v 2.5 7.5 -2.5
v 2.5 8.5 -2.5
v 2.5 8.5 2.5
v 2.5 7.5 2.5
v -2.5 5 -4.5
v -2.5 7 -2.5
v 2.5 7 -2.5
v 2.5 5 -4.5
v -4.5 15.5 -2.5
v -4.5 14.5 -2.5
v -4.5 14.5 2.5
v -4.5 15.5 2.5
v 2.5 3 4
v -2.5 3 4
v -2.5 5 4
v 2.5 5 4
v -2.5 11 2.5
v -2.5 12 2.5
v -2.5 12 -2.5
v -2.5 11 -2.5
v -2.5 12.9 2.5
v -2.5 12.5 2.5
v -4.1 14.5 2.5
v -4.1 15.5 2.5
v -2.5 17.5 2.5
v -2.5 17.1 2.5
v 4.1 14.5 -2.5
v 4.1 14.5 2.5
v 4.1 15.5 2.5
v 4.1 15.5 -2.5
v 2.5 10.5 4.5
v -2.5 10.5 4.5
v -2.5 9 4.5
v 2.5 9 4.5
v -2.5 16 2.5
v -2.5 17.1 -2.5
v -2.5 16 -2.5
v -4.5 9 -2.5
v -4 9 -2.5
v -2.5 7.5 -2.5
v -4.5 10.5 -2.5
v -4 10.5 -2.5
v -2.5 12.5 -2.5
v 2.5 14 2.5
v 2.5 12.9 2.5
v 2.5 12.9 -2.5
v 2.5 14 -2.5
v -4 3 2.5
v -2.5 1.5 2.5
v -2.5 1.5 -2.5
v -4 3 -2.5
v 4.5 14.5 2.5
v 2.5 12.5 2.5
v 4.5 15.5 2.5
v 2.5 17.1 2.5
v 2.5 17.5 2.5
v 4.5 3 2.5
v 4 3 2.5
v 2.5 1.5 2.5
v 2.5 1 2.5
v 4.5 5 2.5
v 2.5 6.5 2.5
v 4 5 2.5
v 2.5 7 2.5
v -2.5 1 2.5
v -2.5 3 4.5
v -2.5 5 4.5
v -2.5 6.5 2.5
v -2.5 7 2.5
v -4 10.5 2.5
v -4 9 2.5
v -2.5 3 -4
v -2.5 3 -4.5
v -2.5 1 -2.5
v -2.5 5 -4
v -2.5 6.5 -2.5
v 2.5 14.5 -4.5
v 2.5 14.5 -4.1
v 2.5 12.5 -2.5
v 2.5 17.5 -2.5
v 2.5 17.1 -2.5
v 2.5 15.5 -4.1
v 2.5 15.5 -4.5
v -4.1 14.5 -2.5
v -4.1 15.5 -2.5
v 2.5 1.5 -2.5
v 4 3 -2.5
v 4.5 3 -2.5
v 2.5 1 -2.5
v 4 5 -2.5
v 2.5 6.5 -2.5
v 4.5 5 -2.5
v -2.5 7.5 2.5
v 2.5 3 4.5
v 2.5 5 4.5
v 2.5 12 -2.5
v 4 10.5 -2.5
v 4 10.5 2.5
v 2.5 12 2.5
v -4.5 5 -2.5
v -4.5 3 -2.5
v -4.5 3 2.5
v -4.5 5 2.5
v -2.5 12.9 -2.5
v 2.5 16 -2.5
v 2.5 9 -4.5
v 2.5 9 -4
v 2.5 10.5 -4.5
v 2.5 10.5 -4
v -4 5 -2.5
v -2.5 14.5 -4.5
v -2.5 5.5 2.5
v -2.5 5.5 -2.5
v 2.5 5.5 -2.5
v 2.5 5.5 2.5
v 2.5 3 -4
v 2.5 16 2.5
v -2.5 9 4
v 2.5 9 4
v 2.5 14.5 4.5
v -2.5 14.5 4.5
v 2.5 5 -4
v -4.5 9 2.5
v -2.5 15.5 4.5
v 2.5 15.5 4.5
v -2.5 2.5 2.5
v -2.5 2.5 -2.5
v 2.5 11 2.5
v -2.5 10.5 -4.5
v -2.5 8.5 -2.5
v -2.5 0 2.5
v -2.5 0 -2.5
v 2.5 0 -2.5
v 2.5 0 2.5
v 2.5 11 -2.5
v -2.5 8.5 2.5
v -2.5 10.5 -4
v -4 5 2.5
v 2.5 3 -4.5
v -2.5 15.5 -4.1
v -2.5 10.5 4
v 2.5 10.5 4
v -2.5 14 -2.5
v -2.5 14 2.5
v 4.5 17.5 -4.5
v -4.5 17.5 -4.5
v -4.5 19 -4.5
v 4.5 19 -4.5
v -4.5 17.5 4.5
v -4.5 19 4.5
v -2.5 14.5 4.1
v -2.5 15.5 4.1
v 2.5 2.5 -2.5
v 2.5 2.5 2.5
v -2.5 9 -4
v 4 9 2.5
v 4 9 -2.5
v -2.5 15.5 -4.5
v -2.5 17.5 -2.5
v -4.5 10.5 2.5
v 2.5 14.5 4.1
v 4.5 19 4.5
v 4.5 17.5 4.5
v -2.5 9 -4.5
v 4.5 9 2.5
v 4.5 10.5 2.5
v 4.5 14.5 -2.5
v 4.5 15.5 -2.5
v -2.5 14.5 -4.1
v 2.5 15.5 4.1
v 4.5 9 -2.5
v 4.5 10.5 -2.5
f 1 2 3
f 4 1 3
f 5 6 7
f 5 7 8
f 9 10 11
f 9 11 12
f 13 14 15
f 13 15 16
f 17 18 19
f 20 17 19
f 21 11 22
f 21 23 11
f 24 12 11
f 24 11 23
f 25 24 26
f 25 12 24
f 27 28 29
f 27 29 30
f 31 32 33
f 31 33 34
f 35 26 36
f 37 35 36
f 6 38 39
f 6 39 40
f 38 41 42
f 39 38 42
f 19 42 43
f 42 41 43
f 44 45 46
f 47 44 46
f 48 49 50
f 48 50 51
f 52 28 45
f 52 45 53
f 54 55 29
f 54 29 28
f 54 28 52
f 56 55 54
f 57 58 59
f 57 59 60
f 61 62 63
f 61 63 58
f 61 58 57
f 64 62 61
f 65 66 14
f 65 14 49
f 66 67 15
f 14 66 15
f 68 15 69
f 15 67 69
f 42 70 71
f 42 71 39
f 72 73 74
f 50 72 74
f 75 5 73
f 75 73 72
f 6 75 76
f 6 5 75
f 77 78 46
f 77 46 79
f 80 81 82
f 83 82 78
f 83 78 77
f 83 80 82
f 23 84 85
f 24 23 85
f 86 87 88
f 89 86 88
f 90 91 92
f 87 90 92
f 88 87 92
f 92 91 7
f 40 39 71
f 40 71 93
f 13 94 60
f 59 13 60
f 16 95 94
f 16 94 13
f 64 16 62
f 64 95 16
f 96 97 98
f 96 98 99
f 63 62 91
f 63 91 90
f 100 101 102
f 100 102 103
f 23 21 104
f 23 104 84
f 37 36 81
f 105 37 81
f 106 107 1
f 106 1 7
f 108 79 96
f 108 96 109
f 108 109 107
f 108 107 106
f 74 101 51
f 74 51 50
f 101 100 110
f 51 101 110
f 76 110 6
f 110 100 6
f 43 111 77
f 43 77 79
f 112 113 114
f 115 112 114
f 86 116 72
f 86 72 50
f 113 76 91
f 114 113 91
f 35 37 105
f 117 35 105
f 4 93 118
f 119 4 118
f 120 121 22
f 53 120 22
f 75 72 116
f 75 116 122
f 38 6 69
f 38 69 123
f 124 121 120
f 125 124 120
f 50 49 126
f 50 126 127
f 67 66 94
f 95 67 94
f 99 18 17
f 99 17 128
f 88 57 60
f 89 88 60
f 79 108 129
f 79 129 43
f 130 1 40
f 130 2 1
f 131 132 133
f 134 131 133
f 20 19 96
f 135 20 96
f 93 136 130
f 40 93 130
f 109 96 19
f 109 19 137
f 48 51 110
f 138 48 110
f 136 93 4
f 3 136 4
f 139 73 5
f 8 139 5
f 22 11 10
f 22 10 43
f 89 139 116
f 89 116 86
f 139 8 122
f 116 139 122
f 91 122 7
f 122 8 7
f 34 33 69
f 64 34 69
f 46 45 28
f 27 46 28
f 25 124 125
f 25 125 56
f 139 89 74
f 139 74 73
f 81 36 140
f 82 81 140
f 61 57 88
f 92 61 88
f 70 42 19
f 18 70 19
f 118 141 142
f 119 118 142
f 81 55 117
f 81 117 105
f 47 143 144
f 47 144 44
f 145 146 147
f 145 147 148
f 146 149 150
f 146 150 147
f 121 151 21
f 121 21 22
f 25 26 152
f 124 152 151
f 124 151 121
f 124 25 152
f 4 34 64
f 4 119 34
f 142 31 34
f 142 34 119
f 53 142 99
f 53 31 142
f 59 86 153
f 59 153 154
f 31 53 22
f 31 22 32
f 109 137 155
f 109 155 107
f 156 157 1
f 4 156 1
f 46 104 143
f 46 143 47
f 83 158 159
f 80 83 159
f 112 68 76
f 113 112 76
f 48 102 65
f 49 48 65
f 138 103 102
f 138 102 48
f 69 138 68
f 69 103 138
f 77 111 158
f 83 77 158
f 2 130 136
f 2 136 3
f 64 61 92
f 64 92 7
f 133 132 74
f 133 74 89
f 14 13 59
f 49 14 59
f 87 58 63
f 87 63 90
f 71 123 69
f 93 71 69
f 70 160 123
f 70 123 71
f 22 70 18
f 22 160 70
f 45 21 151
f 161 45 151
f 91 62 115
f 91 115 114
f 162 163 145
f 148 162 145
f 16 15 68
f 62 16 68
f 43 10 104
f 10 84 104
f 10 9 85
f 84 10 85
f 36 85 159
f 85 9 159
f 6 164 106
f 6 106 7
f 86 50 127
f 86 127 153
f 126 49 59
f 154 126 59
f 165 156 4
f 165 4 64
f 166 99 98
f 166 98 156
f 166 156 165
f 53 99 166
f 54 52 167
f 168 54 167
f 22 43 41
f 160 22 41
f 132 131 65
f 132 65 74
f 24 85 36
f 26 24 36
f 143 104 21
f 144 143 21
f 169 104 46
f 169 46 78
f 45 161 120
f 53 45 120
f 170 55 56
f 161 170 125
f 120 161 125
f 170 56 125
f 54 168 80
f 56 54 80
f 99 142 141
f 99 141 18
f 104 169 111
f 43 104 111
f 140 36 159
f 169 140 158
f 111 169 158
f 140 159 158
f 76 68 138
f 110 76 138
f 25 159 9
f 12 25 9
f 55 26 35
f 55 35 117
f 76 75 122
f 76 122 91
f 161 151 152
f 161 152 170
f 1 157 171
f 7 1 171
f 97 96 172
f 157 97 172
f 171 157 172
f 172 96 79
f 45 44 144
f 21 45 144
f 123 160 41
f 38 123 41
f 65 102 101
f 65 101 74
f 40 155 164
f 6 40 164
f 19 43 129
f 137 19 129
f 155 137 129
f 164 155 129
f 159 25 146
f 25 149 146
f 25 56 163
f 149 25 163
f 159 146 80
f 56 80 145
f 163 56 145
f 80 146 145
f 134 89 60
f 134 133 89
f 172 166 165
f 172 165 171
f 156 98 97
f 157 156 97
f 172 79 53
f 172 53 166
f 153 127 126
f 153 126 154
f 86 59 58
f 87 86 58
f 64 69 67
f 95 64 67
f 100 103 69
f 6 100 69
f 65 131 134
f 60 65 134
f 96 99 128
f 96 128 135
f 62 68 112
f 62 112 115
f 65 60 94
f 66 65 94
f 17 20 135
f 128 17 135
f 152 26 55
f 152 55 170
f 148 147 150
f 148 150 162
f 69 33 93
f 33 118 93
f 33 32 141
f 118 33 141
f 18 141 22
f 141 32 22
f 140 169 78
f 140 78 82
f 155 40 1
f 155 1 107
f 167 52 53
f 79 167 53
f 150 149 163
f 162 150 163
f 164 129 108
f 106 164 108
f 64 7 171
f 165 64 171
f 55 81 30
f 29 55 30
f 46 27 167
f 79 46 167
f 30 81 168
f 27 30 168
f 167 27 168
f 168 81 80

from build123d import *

# Parameters (mm, degrees)
SKETCH2_W                = 5
SKETCH2_H                = 5
BOSS_EXTRUDE1_DEPTH      = 2.5
BOSS_EXTRUDE2_DEPTH      = 5
BOSS_EXTRUDE3_DEPTH      = 5
SKETCH5_W                = 0.5
SKETCH5_H                = 5
BOSS_EXTRUDE4_DEPTH      = 1
SKETCH6_W                = 5
SKETCH6_H                = 0.5
BOSS_EXTRUDE5_DEPTH      = 1
MIRROR3_START            = -2.5
MIRROR3_OUTLINE_W        = 0.5
MIRROR3_OUTLINE_H        = 1
MIRROR3_DEPTH            = 5
MIRROR5_COPY_1_DEPTH     = 5
MIRROR5_COPY_2_DEPTH     = 5
MIRROR6_START            = -2.5
MIRROR6_OUTLINE_W        = 1
MIRROR6_OUTLINE_H        = 0.5
MIRROR6_DEPTH            = 5
BOSS_EXTRUDE7_DEPTH      = 5
BOSS_EXTRUDE9_DEPTH      = 5
SKETCH10_W               = 5
SKETCH10_H               = 1
CUT_EXTRUDE1_DEPTH       = 12.543396381
SKETCH11_W               = 5
SKETCH11_H               = 5
BOSS_EXTRUDE11_DEPTH     = 1.5
BOSS_EXTRUDE13_DEPTH     = 5
BOSS_EXTRUDE14_DEPTH     = 5
SKETCH15_W               = 0.5
SKETCH15_H               = 5
BOSS_EXTRUDE15_DEPTH     = 0.75
SKETCH16_W               = 5
SKETCH16_H               = 0.5
BOSS_EXTRUDE16_DEPTH     = 0.75
MIRROR16_COPY_1_SKETCH_W = 0.5
MIRROR16_COPY_1_SKETCH_H = 5
MIRROR16_COPY_1_DEPTH    = 0.75
MIRROR16_COPY_2_SKETCH_W = 5
MIRROR16_COPY_2_SKETCH_H = 0.5
MIRROR16_COPY_2_DEPTH    = 0.75
MIRROR18_COPY_1_DEPTH    = 5
BOSS_EXTRUDE18_DEPTH     = 5
BOSS_EXTRUDE19_DEPTH     = 5
SKETCH20_W               = 5
SKETCH20_H               = 5
BOSS_EXTRUDE20_DEPTH     = 1.5
BOSS_EXTRUDE21_DEPTH     = 5
BOSS_EXTRUDE22_DEPTH     = 5
SKETCH23_W               = 0.4
SKETCH23_H               = 5
BOSS_EXTRUDE23_DEPTH     = 0.5
SKETCH24_W               = 5
SKETCH24_H               = 0.4
BOSS_EXTRUDE24_DEPTH     = 0.5
MIRROR24_START           = -2.5
MIRROR24_OUTLINE_W       = 0.4
MIRROR24_OUTLINE_H       = 0.5
MIRROR24_DEPTH           = 5
MIRROR25_START           = -2.5
MIRROR25_DEPTH           = 5
MIRROR26_START           = -2.5
MIRROR26_OUTLINE_W       = 0.5
MIRROR26_OUTLINE_H       = 0.4
MIRROR26_DEPTH           = 5
BOSS_EXTRUDE25_DEPTH     = 5
BOSS_EXTRUDE26_DEPTH     = 5
SKETCH27_W               = 9
SKETCH27_H               = 9
BOSS_EXTRUDE27_DEPTH     = 1.5


# Read off the part's stored shape, not the designer's step: Mirror3, Mirror6, Mirror24, Mirror25, Mirror26
with BuildPart() as part:
    # Sketch2 → Boss-Extrude1 (new body)
    with BuildSketch(Plane(origin=(0, 0, 0), x_dir=(1, 0, 0), z_dir=(0, 1, 0))):
        Rectangle(SKETCH2_W, SKETCH2_H)
    boss_extrude1 = extrude(amount=BOSS_EXTRUDE1_DEPTH)

    # Sketch3 → Boss-Extrude2 (add)
    with BuildSketch(Plane.XY.offset(2.5)):
        Polygon((-2.5, 1.5), (-4, 3), (-4.5, 3), (-2.5, 1), align=None)
    boss_extrude2 = extrude(amount=-BOSS_EXTRUDE2_DEPTH)

    # Sketch4 → Boss-Extrude3 (add)
    with BuildSketch(Plane(origin=(2.5, 0, 0), x_dir=(0, 0, -1), z_dir=(1, 0, 0))):
        Polygon((2.5, 1.5), (2.5, 1), (4.5, 3), (4, 3), align=None)
    boss_extrude3 = extrude(amount=-BOSS_EXTRUDE3_DEPTH)

    # Sketch5 → Boss-Extrude4 (add)
    with BuildSketch(Plane(origin=(0, 3, 0), x_dir=(1, 0, 0), z_dir=(0, 1, 0))):
        with Locations((-4.25, 0)):
            Rectangle(SKETCH5_W, SKETCH5_H)
    boss_extrude4 = extrude(amount=BOSS_EXTRUDE4_DEPTH)

    # Sketch6 → Boss-Extrude5 (add)
    with BuildSketch(Plane(origin=(0, 3, 0), x_dir=(1, 0, 0), z_dir=(0, 1, 0))):
        with Locations((0, 4.25)):
            Rectangle(SKETCH6_W, SKETCH6_H)
    boss_extrude5 = extrude(amount=BOSS_EXTRUDE5_DEPTH)

    # Mirror1: Boss-Extrude3, Boss-Extrude5 across plane
    add(boss_extrude3.mirror(Plane.XY))
    add(boss_extrude5.mirror(Plane.XY))

    # Mirror2: Boss-Extrude2, Boss-Extrude4 across plane
    add(boss_extrude2.mirror(Plane(origin=(0, 0, 0), x_dir=(0, 0, 1), z_dir=(1, 0, 0))))
    add(boss_extrude4.mirror(Plane(origin=(0, 0, 0), x_dir=(0, 0, 1), z_dir=(1, 0, 0))))

    # Mirror3 outline → Mirror3 (add)
    with BuildSketch(Plane.XY.offset(MIRROR3_START)):
        with Locations((-4.25, 4.5)):
            Rectangle(MIRROR3_OUTLINE_W, MIRROR3_OUTLINE_H)
        with Locations((4.25, 4.5)):
            Rectangle(MIRROR3_OUTLINE_W, MIRROR3_OUTLINE_H)
    extrude(amount=MIRROR3_DEPTH)

    # Mirror4: Boss-Extrude2 across plane
    add(boss_extrude2.mirror(Plane.ZX.offset(4)))

    # Mirror5 copy 1 sketch → Mirror5 copy 1 (add)
    with BuildSketch(Plane(origin=(0, 8, 2.5), x_dir=(-1, 0, 0), z_dir=(0, 0, 1))):
        Polygon((-2.5, 1.5), (-4, 3), (-4.5, 3), (-2.5, 1), align=None)
    extrude(amount=-MIRROR5_COPY_1_DEPTH)

    # Mirror5 copy 2 sketch → Mirror5 copy 2 (add)
    with BuildSketch(Plane(origin=(0, 0, 2.5), x_dir=(-1, 0, 0), z_dir=(0, 0, 1))):
        Polygon((-2.5, -1.5), (-4, -3), (-4.5, -3), (-2.5, -1), align=None)
    extrude(amount=-MIRROR5_COPY_2_DEPTH)

    # Mirror6 outline → Mirror6 (add)
    with BuildSketch(Plane.YZ.offset(MIRROR6_START)):
        with Locations((4.5, -4.25)):
            Rectangle(MIRROR6_OUTLINE_W, MIRROR6_OUTLINE_H)
        with Locations((4.5, 4.25)):
            Rectangle(MIRROR6_OUTLINE_W, MIRROR6_OUTLINE_H)
    extrude(amount=MIRROR6_DEPTH)

    # Mirror10: Boss-Extrude1 across plane
    add(boss_extrude1.mirror(Plane.ZX.offset(4)))

    # Sketch10 → Cut-Extrude1 (cut, through all)
    with BuildSketch(Plane.XY.offset(2.5)):
        with Locations((0, 7.5)):
            Rectangle(SKETCH10_W, SKETCH10_H)
    extrude(amount=-CUT_EXTRUDE1_DEPTH, mode=Mode.SUBTRACT)



with BuildPart() as body_2:
    # Sketch7 → Boss-Extrude7 (new body)
    with BuildSketch(Plane.ZY.offset(2.5)):
        Polygon((-4.5, 5), (-4, 5), (-2.5, 6.5), (-2.5, 7), align=None)
    extrude(amount=-BOSS_EXTRUDE7_DEPTH)


with BuildPart() as body_3:
    # Sketch8 → Boss-Extrude9 (new body)
    with BuildSketch(Plane.ZY.offset(2.5)):
        Polygon((4.5, 5), (4, 5), (2.5, 6.5), (2.5, 7), align=None)
    extrude(amount=-BOSS_EXTRUDE9_DEPTH)


with BuildPart() as part_1:
    add(part.part)

    add(body_2.part)  # Boss-Extrude11 merges body 2

    add(body_3.part)  # Boss-Extrude11 merges body 3
    # Sketch11 → Boss-Extrude11 (add)
    with BuildSketch(Plane(origin=(0, 7, 0), x_dir=(1, 0, 0), z_dir=(0, 1, 0))):
        Rectangle(SKETCH11_W, SKETCH11_H)
    boss_extrude11 = extrude(amount=BOSS_EXTRUDE11_DEPTH)

    # Sketch13 → Boss-Extrude13 (add)
    with BuildSketch(Plane.ZY.offset(2.5)):
        Polygon((2.5, 7), (2.5, 7.5), (4, 9), (4.5, 9), align=None)
    boss_extrude13 = extrude(amount=-BOSS_EXTRUDE13_DEPTH)

    # Sketch14 → Boss-Extrude14 (add)
    with BuildSketch(Plane(origin=(0, 0, -2.5), x_dir=(-1, 0, 0), z_dir=(0, 0, -1))):
        Polygon((2.5, 7), (4.5, 9), (4, 9), (2.5, 7.5), align=None)
    boss_extrude14 = extrude(amount=-BOSS_EXTRUDE14_DEPTH)

    # Mirror12: Boss-Extrude13 across plane
    add(boss_extrude13.mirror(Plane.XY))

    # Mirror13: Boss-Extrude14 across plane
    add(boss_extrude14.mirror(Plane(origin=(0, 0, 0), x_dir=(0, 0, 1), z_dir=(1, 0, 0))))

    # Sketch15 → Boss-Extrude15 (add)
    with BuildSketch(Plane(origin=(0, 9, 0), x_dir=(1, 0, 0), z_dir=(0, 1, 0))):
        with Locations((-4.25, 0)):
            Rectangle(SKETCH15_W, SKETCH15_H)
    boss_extrude15 = extrude(amount=BOSS_EXTRUDE15_DEPTH)

    # Sketch16 → Boss-Extrude16 (add)
    with BuildSketch(Plane(origin=(0, 9, 0), x_dir=(1, 0, 0), z_dir=(0, 1, 0))):
        with Locations((0, 4.25)):
            Rectangle(SKETCH16_W, SKETCH16_H)
    boss_extrude16 = extrude(amount=BOSS_EXTRUDE16_DEPTH)

    # Mirror14: Boss-Extrude15 across plane
    add(boss_extrude15.mirror(Plane(origin=(0, 0, 0), x_dir=(0, 0, 1), z_dir=(1, 0, 0))))

    # Mirror15: Boss-Extrude16 across plane
    add(boss_extrude16.mirror(Plane.XY))

    # Mirror16: Boss-Extrude15, Boss-Extrude16 across plane
    add(boss_extrude15.mirror(Plane.ZX.offset(9.75)))
    add(boss_extrude16.mirror(Plane.ZX.offset(9.75)))

    # Mirror16 copy 1 sketch → Mirror16 copy 1 (add)
    with BuildSketch(Plane(origin=(0, 10.5, 0), x_dir=(-1, 0, 0), z_dir=(0, -1, 0))):
        with Locations((-4.25, 0)):
            Rectangle(MIRROR16_COPY_1_SKETCH_W, MIRROR16_COPY_1_SKETCH_H)
    extrude(amount=MIRROR16_COPY_1_DEPTH)

    # Mirror16 copy 2 sketch → Mirror16 copy 2 (add)
    with BuildSketch(Plane.XZ.offset(-10.5)):
        with Locations((0, 4.25)):
            Rectangle(MIRROR16_COPY_2_SKETCH_W, MIRROR16_COPY_2_SKETCH_H)
    extrude(amount=MIRROR16_COPY_2_DEPTH)

    # Mirror18: Boss-Extrude14 across plane
    add(boss_extrude14.mirror(Plane.ZX.offset(9.75)))

    # Mirror18 copy 1 sketch → Mirror18 copy 1 (add)
    with BuildSketch(Plane(origin=(0, 19.5, -2.5), x_dir=(1, 0, 0), z_dir=(0, 0, -1))):
        Polygon((2.5, 7), (4.5, 9), (4, 9), (2.5, 7.5), align=None)
    extrude(amount=-MIRROR18_COPY_1_DEPTH)

    # Mirror21: Boss-Extrude11 across plane
    add(boss_extrude11.mirror(Plane.ZX.offset(9.75)))



with BuildPart() as body_2_2:
    # Sketch17 → Boss-Extrude18 (new body)
    with BuildSketch(Plane(origin=(2.5, 0, 0), x_dir=(0, 0, -1), z_dir=(1, 0, 0))):
        Polygon((4, 10.5), (4.5, 10.5), (2.5, 12.5), (2.5, 12), align=None)
    extrude(amount=-BOSS_EXTRUDE18_DEPTH)


with BuildPart() as body_3_2:
    # Sketch18 → Boss-Extrude19 (new body)
    with BuildSketch(Plane(origin=(2.5, 0, 0), x_dir=(0, 0, -1), z_dir=(1, 0, 0))):
        Polygon((-4.5, 10.5), (-4, 10.5), (-2.5, 12), (-2.5, 12.5), align=None)
    extrude(amount=-BOSS_EXTRUDE19_DEPTH)


with BuildPart() as part_2:
    add(part_1.part)

    add(body_2_2.part)  # Boss-Extrude20 merges body 2 2

    add(body_3_2.part)  # Boss-Extrude20 merges body 3 2
    # Sketch20 → Boss-Extrude20 (add)
    with BuildSketch(Plane(origin=(0, 12.5, 0), x_dir=(1, 0, 0), z_dir=(0, 1, 0))):
        Rectangle(SKETCH20_W, SKETCH20_H)
    boss_extrude20 = extrude(amount=BOSS_EXTRUDE20_DEPTH)

    # Sketch21 → Boss-Extrude21 (add)
    with BuildSketch(Plane.XY.offset(2.5)):
        Polygon((2.5, 12.5), (2.5, 12.9), (4.1, 14.5), (4.5, 14.5), align=None)
    boss_extrude21 = extrude(amount=-BOSS_EXTRUDE21_DEPTH)

    # Sketch22 → Boss-Extrude22 (add)
    with BuildSketch(Plane.ZY.offset(2.5)):
        Polygon((2.5, 12.5), (2.5, 12.9), (4.1, 14.5), (4.5, 14.5), align=None)
    boss_extrude22 = extrude(amount=-BOSS_EXTRUDE22_DEPTH)

    # Sketch23 → Boss-Extrude23 (add)
    with BuildSketch(Plane(origin=(0, 14.5, 0), x_dir=(1, 0, 0), z_dir=(0, 1, 0))):
        with Locations((4.3, 0)):
            Rectangle(SKETCH23_W, SKETCH23_H)
    boss_extrude23 = extrude(amount=BOSS_EXTRUDE23_DEPTH)

    # Sketch24 → Boss-Extrude24 (add)
    with BuildSketch(Plane(origin=(0, 14.5, 0), x_dir=(1, 0, 0), z_dir=(0, 1, 0))):
        with Locations((0, -4.3)):
            Rectangle(SKETCH24_W, SKETCH24_H)
    boss_extrude24 = extrude(amount=BOSS_EXTRUDE24_DEPTH)

    # Mirror22: Boss-Extrude22, Boss-Extrude24 across plane
    add(boss_extrude22.mirror(Plane.XY))
    add(boss_extrude24.mirror(Plane.XY))

    # Mirror23: Boss-Extrude21, Boss-Extrude23 across plane
    add(boss_extrude21.mirror(Plane(origin=(0, 0, 0), x_dir=(0, 0, 1), z_dir=(1, 0, 0))))
    add(boss_extrude23.mirror(Plane(origin=(0, 0, 0), x_dir=(0, 0, 1), z_dir=(1, 0, 0))))

    # Mirror24 outline → Mirror24 (add)
    with BuildSketch(Plane.XY.offset(MIRROR24_START)):
        with Locations((-4.3, 15.25)):
            Rectangle(MIRROR24_OUTLINE_W, MIRROR24_OUTLINE_H)
        with Locations((4.3, 15.25)):
            Rectangle(MIRROR24_OUTLINE_W, MIRROR24_OUTLINE_H)
    extrude(amount=MIRROR24_DEPTH)

    # Mirror25 outline → Mirror25 (add)
    with BuildSketch(Plane.XY.offset(MIRROR25_START)):
        Polygon((-2.5, 17.1), (-2.5, 17.5), (-4.5, 15.5), (-4.1, 15.5), align=None)
        Polygon((4.5, 15.5), (2.5, 17.5), (2.5, 17.1), (4.1, 15.5), align=None)
    extrude(amount=MIRROR25_DEPTH)

    # Mirror26 outline → Mirror26 (add)
    with BuildSketch(Plane.YZ.offset(MIRROR26_START)):
        with Locations((15.25, -4.3)):
            Rectangle(MIRROR26_OUTLINE_W, MIRROR26_OUTLINE_H)
        with Locations((15.25, 4.3)):
            Rectangle(MIRROR26_OUTLINE_W, MIRROR26_OUTLINE_H)
    extrude(amount=MIRROR26_DEPTH)

    # Mirror28: Boss-Extrude20 across plane
    add(boss_extrude20.mirror(Plane.ZX.offset(15)))



with BuildPart() as body_2_3:
    # Sketch25 → Boss-Extrude25 (new body)
    with BuildSketch(Plane.ZY.offset(2.5)):
        Polygon((4.1, 15.5), (4.5, 15.5), (2.5, 17.5), (2.5, 17.1), align=None)
    extrude(amount=-BOSS_EXTRUDE25_DEPTH)


with BuildPart() as body_3_3:
    # Sketch26 → Boss-Extrude26 (new body)
    with BuildSketch(Plane.ZY.offset(2.5)):
        Polygon((-4.1, 15.5), (-4.5, 15.5), (-2.5, 17.5), (-2.5, 17.1), align=None)
    extrude(amount=-BOSS_EXTRUDE26_DEPTH)


with BuildPart() as part_3:
    add(part_2.part)

    add(body_2_3.part)  # Boss-Extrude27 merges body 2 3

    add(body_3_3.part)  # Boss-Extrude27 merges body 3 3
    # Sketch27 → Boss-Extrude27 (add)
    with BuildSketch(Plane(origin=(0, 17.5, 0), x_dir=(1, 0, 0), z_dir=(0, 1, 0))):
        Rectangle(SKETCH27_W, SKETCH27_H)
    extrude(amount=BOSS_EXTRUDE27_DEPTH)


solid = part_3.part
